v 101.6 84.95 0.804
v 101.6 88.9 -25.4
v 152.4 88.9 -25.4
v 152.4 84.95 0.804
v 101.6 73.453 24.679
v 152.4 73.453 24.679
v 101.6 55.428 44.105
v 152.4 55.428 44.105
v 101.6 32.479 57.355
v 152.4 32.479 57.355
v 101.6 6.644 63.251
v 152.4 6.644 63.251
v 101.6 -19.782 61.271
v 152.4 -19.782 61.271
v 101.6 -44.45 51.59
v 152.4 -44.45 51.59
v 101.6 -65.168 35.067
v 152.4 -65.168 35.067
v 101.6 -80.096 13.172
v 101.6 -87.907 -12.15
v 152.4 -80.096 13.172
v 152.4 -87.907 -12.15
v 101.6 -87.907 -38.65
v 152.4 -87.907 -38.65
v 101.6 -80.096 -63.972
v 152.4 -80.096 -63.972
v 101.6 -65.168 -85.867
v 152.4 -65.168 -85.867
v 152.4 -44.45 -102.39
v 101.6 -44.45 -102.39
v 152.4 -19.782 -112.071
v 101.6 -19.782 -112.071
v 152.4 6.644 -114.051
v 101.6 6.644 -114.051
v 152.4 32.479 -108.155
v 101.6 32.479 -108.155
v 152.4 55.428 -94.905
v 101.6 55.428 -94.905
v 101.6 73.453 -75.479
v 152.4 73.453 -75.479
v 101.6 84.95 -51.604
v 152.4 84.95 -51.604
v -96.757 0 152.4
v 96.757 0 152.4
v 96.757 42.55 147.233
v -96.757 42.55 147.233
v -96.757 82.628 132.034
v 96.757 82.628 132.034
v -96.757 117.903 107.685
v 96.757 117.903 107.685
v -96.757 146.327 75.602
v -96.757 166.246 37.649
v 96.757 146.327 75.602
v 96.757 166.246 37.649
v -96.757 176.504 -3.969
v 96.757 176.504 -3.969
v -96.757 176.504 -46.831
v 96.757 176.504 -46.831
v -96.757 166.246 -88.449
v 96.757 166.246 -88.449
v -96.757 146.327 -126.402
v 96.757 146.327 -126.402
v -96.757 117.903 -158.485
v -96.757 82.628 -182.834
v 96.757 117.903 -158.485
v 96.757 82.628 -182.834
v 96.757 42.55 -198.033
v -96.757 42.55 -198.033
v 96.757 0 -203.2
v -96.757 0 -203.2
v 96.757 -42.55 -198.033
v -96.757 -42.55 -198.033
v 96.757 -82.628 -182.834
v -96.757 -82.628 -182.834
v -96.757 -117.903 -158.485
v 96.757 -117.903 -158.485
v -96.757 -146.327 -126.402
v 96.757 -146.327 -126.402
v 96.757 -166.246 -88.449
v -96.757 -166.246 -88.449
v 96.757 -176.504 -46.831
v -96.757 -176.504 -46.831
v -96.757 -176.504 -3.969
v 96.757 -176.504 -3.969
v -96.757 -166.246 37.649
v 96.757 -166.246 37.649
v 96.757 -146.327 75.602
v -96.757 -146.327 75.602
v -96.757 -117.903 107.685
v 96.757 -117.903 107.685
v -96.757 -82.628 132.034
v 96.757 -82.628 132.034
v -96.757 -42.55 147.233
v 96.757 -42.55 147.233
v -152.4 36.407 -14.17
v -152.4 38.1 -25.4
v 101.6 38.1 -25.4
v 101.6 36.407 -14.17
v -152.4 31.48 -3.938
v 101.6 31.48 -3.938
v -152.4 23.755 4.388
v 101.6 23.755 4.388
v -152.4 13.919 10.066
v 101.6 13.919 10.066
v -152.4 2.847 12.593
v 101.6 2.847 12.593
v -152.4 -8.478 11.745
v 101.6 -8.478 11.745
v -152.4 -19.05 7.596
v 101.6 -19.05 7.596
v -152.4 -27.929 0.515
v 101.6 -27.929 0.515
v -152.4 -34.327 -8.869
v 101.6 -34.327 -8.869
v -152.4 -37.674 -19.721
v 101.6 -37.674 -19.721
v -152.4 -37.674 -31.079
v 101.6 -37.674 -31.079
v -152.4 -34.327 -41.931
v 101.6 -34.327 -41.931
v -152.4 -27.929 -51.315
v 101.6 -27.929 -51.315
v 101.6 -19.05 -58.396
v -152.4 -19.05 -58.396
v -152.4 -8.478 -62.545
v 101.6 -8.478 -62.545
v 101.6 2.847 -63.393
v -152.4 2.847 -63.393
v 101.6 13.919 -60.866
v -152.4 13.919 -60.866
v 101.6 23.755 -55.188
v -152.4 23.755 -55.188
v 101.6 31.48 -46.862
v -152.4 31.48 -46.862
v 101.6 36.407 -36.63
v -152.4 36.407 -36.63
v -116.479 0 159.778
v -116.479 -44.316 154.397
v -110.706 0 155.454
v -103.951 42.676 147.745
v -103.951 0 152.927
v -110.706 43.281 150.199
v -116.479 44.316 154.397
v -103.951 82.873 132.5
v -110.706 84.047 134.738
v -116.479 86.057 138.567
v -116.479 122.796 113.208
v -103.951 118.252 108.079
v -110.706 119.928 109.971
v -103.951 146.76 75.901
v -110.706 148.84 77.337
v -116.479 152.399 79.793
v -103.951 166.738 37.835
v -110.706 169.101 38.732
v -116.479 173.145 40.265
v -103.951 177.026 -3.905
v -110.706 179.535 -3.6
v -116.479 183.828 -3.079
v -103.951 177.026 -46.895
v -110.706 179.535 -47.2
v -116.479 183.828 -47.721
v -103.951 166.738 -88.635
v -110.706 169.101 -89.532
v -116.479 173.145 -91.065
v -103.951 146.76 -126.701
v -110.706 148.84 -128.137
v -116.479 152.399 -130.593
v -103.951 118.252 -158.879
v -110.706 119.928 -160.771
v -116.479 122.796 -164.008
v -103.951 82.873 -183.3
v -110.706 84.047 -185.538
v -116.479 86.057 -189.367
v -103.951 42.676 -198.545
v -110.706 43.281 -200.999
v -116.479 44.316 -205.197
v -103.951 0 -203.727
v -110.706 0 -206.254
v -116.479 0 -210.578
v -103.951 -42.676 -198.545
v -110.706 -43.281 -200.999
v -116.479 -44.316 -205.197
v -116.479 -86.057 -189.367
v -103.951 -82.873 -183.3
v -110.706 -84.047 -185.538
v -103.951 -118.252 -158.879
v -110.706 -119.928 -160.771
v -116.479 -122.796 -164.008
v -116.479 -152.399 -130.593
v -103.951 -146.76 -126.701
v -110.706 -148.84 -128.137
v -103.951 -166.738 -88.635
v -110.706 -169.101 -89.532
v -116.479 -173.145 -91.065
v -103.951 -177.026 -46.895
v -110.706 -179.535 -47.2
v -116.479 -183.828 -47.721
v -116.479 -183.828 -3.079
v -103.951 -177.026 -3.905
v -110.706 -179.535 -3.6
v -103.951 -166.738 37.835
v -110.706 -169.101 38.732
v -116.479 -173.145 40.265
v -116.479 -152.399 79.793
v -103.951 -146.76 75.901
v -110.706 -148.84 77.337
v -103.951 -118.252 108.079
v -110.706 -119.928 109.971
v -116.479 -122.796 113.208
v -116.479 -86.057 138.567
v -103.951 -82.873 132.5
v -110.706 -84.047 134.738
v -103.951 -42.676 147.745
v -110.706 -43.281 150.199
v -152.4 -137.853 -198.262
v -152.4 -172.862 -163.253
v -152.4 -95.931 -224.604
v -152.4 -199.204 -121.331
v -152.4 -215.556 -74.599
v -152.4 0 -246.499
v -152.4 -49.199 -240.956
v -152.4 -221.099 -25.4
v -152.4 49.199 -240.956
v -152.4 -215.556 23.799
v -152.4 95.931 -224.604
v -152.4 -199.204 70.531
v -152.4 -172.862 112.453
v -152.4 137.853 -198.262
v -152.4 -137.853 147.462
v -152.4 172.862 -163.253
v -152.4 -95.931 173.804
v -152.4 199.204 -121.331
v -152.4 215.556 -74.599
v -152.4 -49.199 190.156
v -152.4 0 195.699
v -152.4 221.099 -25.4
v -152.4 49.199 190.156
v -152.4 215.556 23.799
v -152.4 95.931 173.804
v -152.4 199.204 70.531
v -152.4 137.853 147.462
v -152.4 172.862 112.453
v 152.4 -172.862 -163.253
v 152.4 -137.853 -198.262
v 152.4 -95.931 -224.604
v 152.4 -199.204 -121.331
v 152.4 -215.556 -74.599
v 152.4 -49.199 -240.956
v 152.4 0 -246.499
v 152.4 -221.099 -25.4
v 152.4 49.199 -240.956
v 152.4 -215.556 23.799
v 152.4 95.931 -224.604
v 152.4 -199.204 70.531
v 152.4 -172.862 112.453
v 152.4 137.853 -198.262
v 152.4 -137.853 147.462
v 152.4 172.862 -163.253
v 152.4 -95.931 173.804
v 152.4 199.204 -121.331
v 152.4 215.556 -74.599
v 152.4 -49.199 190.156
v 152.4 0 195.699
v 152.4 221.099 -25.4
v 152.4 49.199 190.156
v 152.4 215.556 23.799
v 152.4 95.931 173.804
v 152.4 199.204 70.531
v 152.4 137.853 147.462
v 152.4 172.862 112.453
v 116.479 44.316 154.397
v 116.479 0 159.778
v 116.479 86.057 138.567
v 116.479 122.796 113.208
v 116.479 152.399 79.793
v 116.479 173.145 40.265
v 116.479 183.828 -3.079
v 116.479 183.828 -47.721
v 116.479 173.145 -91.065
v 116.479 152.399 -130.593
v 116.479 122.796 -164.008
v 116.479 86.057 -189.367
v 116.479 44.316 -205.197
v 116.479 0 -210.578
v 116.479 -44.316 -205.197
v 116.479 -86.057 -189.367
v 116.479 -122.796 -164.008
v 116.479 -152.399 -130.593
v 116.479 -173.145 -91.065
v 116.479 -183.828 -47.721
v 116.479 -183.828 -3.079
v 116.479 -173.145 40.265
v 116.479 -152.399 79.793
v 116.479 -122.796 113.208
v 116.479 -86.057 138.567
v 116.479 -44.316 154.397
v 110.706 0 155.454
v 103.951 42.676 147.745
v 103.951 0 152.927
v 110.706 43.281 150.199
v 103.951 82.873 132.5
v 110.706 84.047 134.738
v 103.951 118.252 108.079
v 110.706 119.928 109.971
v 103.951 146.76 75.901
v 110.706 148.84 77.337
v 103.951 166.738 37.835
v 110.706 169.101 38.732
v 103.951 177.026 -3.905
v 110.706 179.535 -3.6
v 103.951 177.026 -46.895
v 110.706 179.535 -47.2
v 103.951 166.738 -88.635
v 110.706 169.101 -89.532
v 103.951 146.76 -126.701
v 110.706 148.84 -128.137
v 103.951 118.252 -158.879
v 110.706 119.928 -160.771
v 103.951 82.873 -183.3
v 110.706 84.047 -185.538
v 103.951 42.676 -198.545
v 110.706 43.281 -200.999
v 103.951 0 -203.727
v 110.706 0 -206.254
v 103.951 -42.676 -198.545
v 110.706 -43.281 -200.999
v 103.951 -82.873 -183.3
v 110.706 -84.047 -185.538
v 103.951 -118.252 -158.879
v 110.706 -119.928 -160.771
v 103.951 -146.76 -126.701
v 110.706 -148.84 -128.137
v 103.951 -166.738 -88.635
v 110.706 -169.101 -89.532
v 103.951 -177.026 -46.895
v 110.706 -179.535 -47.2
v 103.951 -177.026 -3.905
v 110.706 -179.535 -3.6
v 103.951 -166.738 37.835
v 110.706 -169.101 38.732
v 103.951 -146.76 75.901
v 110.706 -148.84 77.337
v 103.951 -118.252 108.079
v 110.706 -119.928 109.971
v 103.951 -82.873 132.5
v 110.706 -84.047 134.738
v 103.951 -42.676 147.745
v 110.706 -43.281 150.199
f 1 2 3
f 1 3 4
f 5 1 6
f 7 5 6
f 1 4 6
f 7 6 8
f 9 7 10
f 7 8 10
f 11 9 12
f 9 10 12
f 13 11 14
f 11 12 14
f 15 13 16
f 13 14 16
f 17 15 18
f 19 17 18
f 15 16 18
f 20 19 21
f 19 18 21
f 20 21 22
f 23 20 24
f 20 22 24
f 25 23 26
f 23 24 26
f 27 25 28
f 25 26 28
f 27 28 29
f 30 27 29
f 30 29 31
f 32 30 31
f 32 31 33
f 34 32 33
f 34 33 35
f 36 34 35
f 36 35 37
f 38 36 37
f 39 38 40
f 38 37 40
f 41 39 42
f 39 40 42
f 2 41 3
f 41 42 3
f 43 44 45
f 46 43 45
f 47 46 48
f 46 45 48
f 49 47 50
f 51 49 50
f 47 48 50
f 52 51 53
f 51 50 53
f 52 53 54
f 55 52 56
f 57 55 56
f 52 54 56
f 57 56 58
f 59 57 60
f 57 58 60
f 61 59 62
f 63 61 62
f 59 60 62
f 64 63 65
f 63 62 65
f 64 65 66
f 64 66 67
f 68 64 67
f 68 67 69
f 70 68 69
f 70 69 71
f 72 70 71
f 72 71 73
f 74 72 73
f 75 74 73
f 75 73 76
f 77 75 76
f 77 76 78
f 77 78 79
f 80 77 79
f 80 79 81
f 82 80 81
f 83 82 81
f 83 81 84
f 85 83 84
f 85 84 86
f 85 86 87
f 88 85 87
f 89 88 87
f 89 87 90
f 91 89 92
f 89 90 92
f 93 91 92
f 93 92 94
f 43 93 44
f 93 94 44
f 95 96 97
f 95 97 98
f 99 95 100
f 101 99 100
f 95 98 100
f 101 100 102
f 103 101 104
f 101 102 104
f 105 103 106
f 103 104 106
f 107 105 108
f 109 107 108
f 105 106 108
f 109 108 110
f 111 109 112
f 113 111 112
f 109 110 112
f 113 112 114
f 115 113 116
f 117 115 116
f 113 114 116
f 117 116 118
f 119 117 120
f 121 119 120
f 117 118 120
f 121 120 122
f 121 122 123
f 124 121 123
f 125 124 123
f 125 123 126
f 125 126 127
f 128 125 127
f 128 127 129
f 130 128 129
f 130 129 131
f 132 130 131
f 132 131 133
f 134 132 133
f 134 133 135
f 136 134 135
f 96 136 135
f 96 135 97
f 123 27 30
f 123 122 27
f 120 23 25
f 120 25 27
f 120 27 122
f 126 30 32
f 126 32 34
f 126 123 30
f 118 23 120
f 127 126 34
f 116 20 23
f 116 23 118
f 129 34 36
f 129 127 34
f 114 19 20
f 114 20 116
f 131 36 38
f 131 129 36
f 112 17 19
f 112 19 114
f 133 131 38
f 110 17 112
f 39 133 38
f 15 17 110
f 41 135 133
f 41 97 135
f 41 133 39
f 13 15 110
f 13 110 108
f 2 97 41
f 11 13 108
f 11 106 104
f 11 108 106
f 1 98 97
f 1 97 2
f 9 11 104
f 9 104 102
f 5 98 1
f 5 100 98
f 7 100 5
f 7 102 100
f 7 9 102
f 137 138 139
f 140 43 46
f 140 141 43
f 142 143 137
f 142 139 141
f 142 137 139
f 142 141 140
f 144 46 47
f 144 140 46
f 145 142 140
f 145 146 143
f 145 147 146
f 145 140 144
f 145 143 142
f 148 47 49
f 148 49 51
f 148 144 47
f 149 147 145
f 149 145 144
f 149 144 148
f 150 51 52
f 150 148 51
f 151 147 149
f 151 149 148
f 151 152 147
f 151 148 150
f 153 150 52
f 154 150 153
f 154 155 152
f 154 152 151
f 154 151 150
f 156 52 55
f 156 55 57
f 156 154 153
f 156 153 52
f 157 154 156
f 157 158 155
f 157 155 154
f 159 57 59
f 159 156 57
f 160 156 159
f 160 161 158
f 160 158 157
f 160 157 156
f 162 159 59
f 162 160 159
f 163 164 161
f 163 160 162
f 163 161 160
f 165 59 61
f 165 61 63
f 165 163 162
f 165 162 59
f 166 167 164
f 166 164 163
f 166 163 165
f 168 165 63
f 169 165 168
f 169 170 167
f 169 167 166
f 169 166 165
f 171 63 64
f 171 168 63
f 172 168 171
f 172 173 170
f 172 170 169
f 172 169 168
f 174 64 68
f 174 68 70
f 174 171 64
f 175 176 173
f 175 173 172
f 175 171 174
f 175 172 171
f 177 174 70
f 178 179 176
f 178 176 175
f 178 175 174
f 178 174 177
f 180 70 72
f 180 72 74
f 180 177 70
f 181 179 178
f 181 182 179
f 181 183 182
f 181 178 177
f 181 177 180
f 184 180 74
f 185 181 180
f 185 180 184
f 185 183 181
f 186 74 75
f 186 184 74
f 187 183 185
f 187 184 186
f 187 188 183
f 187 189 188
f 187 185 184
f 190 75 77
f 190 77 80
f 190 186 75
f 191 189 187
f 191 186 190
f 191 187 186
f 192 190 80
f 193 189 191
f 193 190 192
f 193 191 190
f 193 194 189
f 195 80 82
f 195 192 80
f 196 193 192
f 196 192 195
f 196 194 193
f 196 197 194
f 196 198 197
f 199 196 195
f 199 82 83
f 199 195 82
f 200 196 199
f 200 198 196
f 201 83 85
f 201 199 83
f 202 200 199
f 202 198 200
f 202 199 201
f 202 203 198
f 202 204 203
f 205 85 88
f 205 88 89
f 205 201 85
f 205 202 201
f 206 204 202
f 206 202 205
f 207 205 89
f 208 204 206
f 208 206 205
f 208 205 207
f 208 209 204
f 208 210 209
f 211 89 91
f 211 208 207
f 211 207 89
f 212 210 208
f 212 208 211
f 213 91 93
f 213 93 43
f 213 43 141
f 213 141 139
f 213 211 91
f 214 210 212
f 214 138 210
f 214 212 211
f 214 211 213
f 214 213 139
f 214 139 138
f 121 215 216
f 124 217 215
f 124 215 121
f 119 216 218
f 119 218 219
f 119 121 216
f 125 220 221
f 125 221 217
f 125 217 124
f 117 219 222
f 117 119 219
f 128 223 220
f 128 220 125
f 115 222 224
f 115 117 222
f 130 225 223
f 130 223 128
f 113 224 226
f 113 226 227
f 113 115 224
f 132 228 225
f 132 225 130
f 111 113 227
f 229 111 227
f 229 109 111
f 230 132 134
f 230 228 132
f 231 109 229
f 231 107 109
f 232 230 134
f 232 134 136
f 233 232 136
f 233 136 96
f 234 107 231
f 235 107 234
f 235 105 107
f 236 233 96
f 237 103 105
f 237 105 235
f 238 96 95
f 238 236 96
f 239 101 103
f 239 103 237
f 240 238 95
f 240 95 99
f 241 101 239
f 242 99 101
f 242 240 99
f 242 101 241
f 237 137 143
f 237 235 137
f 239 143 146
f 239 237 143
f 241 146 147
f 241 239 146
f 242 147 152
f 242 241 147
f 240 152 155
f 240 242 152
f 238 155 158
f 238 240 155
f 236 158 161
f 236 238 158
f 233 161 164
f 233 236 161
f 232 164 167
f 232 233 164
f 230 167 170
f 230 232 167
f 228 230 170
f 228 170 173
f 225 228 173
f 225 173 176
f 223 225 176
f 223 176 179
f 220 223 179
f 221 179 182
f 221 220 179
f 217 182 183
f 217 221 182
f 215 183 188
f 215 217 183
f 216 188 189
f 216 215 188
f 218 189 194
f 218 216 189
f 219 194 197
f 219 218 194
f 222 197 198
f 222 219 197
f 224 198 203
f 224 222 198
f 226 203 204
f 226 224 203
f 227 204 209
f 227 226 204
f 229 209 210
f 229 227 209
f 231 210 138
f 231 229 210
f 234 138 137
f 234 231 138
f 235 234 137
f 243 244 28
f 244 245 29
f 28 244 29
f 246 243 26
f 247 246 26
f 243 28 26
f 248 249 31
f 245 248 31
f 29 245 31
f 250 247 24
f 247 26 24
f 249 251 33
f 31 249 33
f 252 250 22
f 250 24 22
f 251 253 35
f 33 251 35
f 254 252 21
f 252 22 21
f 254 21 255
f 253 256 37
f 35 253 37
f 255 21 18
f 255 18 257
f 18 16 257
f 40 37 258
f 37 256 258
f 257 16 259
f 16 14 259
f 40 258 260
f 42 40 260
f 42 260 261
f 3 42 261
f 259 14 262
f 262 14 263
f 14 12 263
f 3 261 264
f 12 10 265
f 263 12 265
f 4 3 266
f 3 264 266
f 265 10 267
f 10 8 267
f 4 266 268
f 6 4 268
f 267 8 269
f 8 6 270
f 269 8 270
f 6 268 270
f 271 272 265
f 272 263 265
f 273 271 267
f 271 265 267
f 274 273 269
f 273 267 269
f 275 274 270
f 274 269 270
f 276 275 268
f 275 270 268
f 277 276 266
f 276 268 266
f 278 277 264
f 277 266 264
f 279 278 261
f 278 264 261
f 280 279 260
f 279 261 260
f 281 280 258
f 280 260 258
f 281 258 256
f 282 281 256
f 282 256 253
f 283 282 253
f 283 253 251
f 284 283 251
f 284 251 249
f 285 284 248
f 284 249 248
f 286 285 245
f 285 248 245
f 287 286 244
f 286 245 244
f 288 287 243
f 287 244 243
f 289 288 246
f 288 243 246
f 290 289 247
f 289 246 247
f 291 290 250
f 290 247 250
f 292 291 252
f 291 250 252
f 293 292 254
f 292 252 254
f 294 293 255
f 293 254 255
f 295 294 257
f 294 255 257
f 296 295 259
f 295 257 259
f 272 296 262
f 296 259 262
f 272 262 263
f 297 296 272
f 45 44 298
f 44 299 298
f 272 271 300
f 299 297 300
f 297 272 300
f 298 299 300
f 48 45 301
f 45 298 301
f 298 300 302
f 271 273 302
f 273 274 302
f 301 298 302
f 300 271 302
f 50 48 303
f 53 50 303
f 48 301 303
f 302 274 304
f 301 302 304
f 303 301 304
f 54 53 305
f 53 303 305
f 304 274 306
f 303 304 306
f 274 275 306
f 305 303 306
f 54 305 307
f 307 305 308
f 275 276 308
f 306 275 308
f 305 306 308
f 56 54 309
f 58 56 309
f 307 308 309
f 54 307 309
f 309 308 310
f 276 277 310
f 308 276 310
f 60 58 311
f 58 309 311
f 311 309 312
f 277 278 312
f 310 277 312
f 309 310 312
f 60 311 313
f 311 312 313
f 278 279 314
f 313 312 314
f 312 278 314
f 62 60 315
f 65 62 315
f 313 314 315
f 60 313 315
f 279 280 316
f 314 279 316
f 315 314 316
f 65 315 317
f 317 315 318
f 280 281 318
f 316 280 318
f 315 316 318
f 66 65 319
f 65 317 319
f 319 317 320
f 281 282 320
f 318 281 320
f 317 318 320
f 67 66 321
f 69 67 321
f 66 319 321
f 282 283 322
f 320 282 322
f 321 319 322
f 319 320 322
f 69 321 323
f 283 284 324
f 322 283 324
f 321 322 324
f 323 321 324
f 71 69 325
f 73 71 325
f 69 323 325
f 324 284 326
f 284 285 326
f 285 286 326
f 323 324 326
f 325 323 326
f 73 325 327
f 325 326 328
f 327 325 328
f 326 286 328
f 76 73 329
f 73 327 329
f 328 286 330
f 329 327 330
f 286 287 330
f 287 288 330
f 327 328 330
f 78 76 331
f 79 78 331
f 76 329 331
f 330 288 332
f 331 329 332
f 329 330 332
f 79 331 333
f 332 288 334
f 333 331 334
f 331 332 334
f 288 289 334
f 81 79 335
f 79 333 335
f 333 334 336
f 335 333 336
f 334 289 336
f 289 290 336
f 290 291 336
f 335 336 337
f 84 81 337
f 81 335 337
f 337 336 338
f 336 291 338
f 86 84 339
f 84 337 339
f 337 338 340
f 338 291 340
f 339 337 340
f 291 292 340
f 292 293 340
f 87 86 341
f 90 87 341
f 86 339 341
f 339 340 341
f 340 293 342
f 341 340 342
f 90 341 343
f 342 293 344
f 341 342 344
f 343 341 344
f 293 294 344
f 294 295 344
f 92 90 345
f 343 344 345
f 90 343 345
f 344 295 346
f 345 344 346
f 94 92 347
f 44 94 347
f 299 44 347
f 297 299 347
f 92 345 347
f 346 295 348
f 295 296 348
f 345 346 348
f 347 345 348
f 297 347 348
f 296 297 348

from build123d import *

# Parameters (mm, degrees)
F3_R     = 38.1
F3_R_2   = 25.4
F4_DEPTH = 304.801
F5_R     = 88.9
F5_R_2   = 38.1
F6_DEPTH = 50.8


with BuildPart() as f1:
    # F0 (on Front) → F1 (revolve)
    with BuildSketch(Plane.XZ):
        with BuildLine():
            Line((-152.4, 0), (0, 0))
            Line((0, 0), (0, 152.4))
            Line((0, 152.4), (-96.757379, 152.4))
            ThreePointArc((-96.757379, 152.4), (-107.418768, 153.949285), (-116.478976, 159.778363))
            Line((-116.478976, 159.778363), (-152.4, 195.699387))
            Line((-152.4, 195.699387), (-152.4, 0))
        make_face()
    revolve(axis=Axis((-127.974883, 0, -25.4), (-1, 0, 0)))

    # F2: F1 across face


with BuildPart() as f1_1:
    add(f1.part)
    add(f1.part.mirror(Plane(origin=(0, 0, -25.4), x_dir=(0, 1, 0), z_dir=(1, 0, 0))))

    # F3 (on face) → F4 (cut, through all)
    with BuildSketch(Plane.YZ.offset(152.4)):
        with Locations((0, -25.4)):
            Circle(F3_R)
        with Locations((0, -25.4)):
            Circle(F3_R_2, mode=Mode.SUBTRACT)
    extrude(amount=-F4_DEPTH, mode=Mode.SUBTRACT)

    # F5 (on face) → F6 (cut)
    with BuildSketch(Plane.YZ.offset(152.4)):
        with Locations((0, -25.4)):
            Circle(F5_R)
        with Locations((0, -25.4)):
            Circle(F5_R_2, mode=Mode.SUBTRACT)
    extrude(amount=-F6_DEPTH, mode=Mode.SUBTRACT)


solid = f1_1.part
